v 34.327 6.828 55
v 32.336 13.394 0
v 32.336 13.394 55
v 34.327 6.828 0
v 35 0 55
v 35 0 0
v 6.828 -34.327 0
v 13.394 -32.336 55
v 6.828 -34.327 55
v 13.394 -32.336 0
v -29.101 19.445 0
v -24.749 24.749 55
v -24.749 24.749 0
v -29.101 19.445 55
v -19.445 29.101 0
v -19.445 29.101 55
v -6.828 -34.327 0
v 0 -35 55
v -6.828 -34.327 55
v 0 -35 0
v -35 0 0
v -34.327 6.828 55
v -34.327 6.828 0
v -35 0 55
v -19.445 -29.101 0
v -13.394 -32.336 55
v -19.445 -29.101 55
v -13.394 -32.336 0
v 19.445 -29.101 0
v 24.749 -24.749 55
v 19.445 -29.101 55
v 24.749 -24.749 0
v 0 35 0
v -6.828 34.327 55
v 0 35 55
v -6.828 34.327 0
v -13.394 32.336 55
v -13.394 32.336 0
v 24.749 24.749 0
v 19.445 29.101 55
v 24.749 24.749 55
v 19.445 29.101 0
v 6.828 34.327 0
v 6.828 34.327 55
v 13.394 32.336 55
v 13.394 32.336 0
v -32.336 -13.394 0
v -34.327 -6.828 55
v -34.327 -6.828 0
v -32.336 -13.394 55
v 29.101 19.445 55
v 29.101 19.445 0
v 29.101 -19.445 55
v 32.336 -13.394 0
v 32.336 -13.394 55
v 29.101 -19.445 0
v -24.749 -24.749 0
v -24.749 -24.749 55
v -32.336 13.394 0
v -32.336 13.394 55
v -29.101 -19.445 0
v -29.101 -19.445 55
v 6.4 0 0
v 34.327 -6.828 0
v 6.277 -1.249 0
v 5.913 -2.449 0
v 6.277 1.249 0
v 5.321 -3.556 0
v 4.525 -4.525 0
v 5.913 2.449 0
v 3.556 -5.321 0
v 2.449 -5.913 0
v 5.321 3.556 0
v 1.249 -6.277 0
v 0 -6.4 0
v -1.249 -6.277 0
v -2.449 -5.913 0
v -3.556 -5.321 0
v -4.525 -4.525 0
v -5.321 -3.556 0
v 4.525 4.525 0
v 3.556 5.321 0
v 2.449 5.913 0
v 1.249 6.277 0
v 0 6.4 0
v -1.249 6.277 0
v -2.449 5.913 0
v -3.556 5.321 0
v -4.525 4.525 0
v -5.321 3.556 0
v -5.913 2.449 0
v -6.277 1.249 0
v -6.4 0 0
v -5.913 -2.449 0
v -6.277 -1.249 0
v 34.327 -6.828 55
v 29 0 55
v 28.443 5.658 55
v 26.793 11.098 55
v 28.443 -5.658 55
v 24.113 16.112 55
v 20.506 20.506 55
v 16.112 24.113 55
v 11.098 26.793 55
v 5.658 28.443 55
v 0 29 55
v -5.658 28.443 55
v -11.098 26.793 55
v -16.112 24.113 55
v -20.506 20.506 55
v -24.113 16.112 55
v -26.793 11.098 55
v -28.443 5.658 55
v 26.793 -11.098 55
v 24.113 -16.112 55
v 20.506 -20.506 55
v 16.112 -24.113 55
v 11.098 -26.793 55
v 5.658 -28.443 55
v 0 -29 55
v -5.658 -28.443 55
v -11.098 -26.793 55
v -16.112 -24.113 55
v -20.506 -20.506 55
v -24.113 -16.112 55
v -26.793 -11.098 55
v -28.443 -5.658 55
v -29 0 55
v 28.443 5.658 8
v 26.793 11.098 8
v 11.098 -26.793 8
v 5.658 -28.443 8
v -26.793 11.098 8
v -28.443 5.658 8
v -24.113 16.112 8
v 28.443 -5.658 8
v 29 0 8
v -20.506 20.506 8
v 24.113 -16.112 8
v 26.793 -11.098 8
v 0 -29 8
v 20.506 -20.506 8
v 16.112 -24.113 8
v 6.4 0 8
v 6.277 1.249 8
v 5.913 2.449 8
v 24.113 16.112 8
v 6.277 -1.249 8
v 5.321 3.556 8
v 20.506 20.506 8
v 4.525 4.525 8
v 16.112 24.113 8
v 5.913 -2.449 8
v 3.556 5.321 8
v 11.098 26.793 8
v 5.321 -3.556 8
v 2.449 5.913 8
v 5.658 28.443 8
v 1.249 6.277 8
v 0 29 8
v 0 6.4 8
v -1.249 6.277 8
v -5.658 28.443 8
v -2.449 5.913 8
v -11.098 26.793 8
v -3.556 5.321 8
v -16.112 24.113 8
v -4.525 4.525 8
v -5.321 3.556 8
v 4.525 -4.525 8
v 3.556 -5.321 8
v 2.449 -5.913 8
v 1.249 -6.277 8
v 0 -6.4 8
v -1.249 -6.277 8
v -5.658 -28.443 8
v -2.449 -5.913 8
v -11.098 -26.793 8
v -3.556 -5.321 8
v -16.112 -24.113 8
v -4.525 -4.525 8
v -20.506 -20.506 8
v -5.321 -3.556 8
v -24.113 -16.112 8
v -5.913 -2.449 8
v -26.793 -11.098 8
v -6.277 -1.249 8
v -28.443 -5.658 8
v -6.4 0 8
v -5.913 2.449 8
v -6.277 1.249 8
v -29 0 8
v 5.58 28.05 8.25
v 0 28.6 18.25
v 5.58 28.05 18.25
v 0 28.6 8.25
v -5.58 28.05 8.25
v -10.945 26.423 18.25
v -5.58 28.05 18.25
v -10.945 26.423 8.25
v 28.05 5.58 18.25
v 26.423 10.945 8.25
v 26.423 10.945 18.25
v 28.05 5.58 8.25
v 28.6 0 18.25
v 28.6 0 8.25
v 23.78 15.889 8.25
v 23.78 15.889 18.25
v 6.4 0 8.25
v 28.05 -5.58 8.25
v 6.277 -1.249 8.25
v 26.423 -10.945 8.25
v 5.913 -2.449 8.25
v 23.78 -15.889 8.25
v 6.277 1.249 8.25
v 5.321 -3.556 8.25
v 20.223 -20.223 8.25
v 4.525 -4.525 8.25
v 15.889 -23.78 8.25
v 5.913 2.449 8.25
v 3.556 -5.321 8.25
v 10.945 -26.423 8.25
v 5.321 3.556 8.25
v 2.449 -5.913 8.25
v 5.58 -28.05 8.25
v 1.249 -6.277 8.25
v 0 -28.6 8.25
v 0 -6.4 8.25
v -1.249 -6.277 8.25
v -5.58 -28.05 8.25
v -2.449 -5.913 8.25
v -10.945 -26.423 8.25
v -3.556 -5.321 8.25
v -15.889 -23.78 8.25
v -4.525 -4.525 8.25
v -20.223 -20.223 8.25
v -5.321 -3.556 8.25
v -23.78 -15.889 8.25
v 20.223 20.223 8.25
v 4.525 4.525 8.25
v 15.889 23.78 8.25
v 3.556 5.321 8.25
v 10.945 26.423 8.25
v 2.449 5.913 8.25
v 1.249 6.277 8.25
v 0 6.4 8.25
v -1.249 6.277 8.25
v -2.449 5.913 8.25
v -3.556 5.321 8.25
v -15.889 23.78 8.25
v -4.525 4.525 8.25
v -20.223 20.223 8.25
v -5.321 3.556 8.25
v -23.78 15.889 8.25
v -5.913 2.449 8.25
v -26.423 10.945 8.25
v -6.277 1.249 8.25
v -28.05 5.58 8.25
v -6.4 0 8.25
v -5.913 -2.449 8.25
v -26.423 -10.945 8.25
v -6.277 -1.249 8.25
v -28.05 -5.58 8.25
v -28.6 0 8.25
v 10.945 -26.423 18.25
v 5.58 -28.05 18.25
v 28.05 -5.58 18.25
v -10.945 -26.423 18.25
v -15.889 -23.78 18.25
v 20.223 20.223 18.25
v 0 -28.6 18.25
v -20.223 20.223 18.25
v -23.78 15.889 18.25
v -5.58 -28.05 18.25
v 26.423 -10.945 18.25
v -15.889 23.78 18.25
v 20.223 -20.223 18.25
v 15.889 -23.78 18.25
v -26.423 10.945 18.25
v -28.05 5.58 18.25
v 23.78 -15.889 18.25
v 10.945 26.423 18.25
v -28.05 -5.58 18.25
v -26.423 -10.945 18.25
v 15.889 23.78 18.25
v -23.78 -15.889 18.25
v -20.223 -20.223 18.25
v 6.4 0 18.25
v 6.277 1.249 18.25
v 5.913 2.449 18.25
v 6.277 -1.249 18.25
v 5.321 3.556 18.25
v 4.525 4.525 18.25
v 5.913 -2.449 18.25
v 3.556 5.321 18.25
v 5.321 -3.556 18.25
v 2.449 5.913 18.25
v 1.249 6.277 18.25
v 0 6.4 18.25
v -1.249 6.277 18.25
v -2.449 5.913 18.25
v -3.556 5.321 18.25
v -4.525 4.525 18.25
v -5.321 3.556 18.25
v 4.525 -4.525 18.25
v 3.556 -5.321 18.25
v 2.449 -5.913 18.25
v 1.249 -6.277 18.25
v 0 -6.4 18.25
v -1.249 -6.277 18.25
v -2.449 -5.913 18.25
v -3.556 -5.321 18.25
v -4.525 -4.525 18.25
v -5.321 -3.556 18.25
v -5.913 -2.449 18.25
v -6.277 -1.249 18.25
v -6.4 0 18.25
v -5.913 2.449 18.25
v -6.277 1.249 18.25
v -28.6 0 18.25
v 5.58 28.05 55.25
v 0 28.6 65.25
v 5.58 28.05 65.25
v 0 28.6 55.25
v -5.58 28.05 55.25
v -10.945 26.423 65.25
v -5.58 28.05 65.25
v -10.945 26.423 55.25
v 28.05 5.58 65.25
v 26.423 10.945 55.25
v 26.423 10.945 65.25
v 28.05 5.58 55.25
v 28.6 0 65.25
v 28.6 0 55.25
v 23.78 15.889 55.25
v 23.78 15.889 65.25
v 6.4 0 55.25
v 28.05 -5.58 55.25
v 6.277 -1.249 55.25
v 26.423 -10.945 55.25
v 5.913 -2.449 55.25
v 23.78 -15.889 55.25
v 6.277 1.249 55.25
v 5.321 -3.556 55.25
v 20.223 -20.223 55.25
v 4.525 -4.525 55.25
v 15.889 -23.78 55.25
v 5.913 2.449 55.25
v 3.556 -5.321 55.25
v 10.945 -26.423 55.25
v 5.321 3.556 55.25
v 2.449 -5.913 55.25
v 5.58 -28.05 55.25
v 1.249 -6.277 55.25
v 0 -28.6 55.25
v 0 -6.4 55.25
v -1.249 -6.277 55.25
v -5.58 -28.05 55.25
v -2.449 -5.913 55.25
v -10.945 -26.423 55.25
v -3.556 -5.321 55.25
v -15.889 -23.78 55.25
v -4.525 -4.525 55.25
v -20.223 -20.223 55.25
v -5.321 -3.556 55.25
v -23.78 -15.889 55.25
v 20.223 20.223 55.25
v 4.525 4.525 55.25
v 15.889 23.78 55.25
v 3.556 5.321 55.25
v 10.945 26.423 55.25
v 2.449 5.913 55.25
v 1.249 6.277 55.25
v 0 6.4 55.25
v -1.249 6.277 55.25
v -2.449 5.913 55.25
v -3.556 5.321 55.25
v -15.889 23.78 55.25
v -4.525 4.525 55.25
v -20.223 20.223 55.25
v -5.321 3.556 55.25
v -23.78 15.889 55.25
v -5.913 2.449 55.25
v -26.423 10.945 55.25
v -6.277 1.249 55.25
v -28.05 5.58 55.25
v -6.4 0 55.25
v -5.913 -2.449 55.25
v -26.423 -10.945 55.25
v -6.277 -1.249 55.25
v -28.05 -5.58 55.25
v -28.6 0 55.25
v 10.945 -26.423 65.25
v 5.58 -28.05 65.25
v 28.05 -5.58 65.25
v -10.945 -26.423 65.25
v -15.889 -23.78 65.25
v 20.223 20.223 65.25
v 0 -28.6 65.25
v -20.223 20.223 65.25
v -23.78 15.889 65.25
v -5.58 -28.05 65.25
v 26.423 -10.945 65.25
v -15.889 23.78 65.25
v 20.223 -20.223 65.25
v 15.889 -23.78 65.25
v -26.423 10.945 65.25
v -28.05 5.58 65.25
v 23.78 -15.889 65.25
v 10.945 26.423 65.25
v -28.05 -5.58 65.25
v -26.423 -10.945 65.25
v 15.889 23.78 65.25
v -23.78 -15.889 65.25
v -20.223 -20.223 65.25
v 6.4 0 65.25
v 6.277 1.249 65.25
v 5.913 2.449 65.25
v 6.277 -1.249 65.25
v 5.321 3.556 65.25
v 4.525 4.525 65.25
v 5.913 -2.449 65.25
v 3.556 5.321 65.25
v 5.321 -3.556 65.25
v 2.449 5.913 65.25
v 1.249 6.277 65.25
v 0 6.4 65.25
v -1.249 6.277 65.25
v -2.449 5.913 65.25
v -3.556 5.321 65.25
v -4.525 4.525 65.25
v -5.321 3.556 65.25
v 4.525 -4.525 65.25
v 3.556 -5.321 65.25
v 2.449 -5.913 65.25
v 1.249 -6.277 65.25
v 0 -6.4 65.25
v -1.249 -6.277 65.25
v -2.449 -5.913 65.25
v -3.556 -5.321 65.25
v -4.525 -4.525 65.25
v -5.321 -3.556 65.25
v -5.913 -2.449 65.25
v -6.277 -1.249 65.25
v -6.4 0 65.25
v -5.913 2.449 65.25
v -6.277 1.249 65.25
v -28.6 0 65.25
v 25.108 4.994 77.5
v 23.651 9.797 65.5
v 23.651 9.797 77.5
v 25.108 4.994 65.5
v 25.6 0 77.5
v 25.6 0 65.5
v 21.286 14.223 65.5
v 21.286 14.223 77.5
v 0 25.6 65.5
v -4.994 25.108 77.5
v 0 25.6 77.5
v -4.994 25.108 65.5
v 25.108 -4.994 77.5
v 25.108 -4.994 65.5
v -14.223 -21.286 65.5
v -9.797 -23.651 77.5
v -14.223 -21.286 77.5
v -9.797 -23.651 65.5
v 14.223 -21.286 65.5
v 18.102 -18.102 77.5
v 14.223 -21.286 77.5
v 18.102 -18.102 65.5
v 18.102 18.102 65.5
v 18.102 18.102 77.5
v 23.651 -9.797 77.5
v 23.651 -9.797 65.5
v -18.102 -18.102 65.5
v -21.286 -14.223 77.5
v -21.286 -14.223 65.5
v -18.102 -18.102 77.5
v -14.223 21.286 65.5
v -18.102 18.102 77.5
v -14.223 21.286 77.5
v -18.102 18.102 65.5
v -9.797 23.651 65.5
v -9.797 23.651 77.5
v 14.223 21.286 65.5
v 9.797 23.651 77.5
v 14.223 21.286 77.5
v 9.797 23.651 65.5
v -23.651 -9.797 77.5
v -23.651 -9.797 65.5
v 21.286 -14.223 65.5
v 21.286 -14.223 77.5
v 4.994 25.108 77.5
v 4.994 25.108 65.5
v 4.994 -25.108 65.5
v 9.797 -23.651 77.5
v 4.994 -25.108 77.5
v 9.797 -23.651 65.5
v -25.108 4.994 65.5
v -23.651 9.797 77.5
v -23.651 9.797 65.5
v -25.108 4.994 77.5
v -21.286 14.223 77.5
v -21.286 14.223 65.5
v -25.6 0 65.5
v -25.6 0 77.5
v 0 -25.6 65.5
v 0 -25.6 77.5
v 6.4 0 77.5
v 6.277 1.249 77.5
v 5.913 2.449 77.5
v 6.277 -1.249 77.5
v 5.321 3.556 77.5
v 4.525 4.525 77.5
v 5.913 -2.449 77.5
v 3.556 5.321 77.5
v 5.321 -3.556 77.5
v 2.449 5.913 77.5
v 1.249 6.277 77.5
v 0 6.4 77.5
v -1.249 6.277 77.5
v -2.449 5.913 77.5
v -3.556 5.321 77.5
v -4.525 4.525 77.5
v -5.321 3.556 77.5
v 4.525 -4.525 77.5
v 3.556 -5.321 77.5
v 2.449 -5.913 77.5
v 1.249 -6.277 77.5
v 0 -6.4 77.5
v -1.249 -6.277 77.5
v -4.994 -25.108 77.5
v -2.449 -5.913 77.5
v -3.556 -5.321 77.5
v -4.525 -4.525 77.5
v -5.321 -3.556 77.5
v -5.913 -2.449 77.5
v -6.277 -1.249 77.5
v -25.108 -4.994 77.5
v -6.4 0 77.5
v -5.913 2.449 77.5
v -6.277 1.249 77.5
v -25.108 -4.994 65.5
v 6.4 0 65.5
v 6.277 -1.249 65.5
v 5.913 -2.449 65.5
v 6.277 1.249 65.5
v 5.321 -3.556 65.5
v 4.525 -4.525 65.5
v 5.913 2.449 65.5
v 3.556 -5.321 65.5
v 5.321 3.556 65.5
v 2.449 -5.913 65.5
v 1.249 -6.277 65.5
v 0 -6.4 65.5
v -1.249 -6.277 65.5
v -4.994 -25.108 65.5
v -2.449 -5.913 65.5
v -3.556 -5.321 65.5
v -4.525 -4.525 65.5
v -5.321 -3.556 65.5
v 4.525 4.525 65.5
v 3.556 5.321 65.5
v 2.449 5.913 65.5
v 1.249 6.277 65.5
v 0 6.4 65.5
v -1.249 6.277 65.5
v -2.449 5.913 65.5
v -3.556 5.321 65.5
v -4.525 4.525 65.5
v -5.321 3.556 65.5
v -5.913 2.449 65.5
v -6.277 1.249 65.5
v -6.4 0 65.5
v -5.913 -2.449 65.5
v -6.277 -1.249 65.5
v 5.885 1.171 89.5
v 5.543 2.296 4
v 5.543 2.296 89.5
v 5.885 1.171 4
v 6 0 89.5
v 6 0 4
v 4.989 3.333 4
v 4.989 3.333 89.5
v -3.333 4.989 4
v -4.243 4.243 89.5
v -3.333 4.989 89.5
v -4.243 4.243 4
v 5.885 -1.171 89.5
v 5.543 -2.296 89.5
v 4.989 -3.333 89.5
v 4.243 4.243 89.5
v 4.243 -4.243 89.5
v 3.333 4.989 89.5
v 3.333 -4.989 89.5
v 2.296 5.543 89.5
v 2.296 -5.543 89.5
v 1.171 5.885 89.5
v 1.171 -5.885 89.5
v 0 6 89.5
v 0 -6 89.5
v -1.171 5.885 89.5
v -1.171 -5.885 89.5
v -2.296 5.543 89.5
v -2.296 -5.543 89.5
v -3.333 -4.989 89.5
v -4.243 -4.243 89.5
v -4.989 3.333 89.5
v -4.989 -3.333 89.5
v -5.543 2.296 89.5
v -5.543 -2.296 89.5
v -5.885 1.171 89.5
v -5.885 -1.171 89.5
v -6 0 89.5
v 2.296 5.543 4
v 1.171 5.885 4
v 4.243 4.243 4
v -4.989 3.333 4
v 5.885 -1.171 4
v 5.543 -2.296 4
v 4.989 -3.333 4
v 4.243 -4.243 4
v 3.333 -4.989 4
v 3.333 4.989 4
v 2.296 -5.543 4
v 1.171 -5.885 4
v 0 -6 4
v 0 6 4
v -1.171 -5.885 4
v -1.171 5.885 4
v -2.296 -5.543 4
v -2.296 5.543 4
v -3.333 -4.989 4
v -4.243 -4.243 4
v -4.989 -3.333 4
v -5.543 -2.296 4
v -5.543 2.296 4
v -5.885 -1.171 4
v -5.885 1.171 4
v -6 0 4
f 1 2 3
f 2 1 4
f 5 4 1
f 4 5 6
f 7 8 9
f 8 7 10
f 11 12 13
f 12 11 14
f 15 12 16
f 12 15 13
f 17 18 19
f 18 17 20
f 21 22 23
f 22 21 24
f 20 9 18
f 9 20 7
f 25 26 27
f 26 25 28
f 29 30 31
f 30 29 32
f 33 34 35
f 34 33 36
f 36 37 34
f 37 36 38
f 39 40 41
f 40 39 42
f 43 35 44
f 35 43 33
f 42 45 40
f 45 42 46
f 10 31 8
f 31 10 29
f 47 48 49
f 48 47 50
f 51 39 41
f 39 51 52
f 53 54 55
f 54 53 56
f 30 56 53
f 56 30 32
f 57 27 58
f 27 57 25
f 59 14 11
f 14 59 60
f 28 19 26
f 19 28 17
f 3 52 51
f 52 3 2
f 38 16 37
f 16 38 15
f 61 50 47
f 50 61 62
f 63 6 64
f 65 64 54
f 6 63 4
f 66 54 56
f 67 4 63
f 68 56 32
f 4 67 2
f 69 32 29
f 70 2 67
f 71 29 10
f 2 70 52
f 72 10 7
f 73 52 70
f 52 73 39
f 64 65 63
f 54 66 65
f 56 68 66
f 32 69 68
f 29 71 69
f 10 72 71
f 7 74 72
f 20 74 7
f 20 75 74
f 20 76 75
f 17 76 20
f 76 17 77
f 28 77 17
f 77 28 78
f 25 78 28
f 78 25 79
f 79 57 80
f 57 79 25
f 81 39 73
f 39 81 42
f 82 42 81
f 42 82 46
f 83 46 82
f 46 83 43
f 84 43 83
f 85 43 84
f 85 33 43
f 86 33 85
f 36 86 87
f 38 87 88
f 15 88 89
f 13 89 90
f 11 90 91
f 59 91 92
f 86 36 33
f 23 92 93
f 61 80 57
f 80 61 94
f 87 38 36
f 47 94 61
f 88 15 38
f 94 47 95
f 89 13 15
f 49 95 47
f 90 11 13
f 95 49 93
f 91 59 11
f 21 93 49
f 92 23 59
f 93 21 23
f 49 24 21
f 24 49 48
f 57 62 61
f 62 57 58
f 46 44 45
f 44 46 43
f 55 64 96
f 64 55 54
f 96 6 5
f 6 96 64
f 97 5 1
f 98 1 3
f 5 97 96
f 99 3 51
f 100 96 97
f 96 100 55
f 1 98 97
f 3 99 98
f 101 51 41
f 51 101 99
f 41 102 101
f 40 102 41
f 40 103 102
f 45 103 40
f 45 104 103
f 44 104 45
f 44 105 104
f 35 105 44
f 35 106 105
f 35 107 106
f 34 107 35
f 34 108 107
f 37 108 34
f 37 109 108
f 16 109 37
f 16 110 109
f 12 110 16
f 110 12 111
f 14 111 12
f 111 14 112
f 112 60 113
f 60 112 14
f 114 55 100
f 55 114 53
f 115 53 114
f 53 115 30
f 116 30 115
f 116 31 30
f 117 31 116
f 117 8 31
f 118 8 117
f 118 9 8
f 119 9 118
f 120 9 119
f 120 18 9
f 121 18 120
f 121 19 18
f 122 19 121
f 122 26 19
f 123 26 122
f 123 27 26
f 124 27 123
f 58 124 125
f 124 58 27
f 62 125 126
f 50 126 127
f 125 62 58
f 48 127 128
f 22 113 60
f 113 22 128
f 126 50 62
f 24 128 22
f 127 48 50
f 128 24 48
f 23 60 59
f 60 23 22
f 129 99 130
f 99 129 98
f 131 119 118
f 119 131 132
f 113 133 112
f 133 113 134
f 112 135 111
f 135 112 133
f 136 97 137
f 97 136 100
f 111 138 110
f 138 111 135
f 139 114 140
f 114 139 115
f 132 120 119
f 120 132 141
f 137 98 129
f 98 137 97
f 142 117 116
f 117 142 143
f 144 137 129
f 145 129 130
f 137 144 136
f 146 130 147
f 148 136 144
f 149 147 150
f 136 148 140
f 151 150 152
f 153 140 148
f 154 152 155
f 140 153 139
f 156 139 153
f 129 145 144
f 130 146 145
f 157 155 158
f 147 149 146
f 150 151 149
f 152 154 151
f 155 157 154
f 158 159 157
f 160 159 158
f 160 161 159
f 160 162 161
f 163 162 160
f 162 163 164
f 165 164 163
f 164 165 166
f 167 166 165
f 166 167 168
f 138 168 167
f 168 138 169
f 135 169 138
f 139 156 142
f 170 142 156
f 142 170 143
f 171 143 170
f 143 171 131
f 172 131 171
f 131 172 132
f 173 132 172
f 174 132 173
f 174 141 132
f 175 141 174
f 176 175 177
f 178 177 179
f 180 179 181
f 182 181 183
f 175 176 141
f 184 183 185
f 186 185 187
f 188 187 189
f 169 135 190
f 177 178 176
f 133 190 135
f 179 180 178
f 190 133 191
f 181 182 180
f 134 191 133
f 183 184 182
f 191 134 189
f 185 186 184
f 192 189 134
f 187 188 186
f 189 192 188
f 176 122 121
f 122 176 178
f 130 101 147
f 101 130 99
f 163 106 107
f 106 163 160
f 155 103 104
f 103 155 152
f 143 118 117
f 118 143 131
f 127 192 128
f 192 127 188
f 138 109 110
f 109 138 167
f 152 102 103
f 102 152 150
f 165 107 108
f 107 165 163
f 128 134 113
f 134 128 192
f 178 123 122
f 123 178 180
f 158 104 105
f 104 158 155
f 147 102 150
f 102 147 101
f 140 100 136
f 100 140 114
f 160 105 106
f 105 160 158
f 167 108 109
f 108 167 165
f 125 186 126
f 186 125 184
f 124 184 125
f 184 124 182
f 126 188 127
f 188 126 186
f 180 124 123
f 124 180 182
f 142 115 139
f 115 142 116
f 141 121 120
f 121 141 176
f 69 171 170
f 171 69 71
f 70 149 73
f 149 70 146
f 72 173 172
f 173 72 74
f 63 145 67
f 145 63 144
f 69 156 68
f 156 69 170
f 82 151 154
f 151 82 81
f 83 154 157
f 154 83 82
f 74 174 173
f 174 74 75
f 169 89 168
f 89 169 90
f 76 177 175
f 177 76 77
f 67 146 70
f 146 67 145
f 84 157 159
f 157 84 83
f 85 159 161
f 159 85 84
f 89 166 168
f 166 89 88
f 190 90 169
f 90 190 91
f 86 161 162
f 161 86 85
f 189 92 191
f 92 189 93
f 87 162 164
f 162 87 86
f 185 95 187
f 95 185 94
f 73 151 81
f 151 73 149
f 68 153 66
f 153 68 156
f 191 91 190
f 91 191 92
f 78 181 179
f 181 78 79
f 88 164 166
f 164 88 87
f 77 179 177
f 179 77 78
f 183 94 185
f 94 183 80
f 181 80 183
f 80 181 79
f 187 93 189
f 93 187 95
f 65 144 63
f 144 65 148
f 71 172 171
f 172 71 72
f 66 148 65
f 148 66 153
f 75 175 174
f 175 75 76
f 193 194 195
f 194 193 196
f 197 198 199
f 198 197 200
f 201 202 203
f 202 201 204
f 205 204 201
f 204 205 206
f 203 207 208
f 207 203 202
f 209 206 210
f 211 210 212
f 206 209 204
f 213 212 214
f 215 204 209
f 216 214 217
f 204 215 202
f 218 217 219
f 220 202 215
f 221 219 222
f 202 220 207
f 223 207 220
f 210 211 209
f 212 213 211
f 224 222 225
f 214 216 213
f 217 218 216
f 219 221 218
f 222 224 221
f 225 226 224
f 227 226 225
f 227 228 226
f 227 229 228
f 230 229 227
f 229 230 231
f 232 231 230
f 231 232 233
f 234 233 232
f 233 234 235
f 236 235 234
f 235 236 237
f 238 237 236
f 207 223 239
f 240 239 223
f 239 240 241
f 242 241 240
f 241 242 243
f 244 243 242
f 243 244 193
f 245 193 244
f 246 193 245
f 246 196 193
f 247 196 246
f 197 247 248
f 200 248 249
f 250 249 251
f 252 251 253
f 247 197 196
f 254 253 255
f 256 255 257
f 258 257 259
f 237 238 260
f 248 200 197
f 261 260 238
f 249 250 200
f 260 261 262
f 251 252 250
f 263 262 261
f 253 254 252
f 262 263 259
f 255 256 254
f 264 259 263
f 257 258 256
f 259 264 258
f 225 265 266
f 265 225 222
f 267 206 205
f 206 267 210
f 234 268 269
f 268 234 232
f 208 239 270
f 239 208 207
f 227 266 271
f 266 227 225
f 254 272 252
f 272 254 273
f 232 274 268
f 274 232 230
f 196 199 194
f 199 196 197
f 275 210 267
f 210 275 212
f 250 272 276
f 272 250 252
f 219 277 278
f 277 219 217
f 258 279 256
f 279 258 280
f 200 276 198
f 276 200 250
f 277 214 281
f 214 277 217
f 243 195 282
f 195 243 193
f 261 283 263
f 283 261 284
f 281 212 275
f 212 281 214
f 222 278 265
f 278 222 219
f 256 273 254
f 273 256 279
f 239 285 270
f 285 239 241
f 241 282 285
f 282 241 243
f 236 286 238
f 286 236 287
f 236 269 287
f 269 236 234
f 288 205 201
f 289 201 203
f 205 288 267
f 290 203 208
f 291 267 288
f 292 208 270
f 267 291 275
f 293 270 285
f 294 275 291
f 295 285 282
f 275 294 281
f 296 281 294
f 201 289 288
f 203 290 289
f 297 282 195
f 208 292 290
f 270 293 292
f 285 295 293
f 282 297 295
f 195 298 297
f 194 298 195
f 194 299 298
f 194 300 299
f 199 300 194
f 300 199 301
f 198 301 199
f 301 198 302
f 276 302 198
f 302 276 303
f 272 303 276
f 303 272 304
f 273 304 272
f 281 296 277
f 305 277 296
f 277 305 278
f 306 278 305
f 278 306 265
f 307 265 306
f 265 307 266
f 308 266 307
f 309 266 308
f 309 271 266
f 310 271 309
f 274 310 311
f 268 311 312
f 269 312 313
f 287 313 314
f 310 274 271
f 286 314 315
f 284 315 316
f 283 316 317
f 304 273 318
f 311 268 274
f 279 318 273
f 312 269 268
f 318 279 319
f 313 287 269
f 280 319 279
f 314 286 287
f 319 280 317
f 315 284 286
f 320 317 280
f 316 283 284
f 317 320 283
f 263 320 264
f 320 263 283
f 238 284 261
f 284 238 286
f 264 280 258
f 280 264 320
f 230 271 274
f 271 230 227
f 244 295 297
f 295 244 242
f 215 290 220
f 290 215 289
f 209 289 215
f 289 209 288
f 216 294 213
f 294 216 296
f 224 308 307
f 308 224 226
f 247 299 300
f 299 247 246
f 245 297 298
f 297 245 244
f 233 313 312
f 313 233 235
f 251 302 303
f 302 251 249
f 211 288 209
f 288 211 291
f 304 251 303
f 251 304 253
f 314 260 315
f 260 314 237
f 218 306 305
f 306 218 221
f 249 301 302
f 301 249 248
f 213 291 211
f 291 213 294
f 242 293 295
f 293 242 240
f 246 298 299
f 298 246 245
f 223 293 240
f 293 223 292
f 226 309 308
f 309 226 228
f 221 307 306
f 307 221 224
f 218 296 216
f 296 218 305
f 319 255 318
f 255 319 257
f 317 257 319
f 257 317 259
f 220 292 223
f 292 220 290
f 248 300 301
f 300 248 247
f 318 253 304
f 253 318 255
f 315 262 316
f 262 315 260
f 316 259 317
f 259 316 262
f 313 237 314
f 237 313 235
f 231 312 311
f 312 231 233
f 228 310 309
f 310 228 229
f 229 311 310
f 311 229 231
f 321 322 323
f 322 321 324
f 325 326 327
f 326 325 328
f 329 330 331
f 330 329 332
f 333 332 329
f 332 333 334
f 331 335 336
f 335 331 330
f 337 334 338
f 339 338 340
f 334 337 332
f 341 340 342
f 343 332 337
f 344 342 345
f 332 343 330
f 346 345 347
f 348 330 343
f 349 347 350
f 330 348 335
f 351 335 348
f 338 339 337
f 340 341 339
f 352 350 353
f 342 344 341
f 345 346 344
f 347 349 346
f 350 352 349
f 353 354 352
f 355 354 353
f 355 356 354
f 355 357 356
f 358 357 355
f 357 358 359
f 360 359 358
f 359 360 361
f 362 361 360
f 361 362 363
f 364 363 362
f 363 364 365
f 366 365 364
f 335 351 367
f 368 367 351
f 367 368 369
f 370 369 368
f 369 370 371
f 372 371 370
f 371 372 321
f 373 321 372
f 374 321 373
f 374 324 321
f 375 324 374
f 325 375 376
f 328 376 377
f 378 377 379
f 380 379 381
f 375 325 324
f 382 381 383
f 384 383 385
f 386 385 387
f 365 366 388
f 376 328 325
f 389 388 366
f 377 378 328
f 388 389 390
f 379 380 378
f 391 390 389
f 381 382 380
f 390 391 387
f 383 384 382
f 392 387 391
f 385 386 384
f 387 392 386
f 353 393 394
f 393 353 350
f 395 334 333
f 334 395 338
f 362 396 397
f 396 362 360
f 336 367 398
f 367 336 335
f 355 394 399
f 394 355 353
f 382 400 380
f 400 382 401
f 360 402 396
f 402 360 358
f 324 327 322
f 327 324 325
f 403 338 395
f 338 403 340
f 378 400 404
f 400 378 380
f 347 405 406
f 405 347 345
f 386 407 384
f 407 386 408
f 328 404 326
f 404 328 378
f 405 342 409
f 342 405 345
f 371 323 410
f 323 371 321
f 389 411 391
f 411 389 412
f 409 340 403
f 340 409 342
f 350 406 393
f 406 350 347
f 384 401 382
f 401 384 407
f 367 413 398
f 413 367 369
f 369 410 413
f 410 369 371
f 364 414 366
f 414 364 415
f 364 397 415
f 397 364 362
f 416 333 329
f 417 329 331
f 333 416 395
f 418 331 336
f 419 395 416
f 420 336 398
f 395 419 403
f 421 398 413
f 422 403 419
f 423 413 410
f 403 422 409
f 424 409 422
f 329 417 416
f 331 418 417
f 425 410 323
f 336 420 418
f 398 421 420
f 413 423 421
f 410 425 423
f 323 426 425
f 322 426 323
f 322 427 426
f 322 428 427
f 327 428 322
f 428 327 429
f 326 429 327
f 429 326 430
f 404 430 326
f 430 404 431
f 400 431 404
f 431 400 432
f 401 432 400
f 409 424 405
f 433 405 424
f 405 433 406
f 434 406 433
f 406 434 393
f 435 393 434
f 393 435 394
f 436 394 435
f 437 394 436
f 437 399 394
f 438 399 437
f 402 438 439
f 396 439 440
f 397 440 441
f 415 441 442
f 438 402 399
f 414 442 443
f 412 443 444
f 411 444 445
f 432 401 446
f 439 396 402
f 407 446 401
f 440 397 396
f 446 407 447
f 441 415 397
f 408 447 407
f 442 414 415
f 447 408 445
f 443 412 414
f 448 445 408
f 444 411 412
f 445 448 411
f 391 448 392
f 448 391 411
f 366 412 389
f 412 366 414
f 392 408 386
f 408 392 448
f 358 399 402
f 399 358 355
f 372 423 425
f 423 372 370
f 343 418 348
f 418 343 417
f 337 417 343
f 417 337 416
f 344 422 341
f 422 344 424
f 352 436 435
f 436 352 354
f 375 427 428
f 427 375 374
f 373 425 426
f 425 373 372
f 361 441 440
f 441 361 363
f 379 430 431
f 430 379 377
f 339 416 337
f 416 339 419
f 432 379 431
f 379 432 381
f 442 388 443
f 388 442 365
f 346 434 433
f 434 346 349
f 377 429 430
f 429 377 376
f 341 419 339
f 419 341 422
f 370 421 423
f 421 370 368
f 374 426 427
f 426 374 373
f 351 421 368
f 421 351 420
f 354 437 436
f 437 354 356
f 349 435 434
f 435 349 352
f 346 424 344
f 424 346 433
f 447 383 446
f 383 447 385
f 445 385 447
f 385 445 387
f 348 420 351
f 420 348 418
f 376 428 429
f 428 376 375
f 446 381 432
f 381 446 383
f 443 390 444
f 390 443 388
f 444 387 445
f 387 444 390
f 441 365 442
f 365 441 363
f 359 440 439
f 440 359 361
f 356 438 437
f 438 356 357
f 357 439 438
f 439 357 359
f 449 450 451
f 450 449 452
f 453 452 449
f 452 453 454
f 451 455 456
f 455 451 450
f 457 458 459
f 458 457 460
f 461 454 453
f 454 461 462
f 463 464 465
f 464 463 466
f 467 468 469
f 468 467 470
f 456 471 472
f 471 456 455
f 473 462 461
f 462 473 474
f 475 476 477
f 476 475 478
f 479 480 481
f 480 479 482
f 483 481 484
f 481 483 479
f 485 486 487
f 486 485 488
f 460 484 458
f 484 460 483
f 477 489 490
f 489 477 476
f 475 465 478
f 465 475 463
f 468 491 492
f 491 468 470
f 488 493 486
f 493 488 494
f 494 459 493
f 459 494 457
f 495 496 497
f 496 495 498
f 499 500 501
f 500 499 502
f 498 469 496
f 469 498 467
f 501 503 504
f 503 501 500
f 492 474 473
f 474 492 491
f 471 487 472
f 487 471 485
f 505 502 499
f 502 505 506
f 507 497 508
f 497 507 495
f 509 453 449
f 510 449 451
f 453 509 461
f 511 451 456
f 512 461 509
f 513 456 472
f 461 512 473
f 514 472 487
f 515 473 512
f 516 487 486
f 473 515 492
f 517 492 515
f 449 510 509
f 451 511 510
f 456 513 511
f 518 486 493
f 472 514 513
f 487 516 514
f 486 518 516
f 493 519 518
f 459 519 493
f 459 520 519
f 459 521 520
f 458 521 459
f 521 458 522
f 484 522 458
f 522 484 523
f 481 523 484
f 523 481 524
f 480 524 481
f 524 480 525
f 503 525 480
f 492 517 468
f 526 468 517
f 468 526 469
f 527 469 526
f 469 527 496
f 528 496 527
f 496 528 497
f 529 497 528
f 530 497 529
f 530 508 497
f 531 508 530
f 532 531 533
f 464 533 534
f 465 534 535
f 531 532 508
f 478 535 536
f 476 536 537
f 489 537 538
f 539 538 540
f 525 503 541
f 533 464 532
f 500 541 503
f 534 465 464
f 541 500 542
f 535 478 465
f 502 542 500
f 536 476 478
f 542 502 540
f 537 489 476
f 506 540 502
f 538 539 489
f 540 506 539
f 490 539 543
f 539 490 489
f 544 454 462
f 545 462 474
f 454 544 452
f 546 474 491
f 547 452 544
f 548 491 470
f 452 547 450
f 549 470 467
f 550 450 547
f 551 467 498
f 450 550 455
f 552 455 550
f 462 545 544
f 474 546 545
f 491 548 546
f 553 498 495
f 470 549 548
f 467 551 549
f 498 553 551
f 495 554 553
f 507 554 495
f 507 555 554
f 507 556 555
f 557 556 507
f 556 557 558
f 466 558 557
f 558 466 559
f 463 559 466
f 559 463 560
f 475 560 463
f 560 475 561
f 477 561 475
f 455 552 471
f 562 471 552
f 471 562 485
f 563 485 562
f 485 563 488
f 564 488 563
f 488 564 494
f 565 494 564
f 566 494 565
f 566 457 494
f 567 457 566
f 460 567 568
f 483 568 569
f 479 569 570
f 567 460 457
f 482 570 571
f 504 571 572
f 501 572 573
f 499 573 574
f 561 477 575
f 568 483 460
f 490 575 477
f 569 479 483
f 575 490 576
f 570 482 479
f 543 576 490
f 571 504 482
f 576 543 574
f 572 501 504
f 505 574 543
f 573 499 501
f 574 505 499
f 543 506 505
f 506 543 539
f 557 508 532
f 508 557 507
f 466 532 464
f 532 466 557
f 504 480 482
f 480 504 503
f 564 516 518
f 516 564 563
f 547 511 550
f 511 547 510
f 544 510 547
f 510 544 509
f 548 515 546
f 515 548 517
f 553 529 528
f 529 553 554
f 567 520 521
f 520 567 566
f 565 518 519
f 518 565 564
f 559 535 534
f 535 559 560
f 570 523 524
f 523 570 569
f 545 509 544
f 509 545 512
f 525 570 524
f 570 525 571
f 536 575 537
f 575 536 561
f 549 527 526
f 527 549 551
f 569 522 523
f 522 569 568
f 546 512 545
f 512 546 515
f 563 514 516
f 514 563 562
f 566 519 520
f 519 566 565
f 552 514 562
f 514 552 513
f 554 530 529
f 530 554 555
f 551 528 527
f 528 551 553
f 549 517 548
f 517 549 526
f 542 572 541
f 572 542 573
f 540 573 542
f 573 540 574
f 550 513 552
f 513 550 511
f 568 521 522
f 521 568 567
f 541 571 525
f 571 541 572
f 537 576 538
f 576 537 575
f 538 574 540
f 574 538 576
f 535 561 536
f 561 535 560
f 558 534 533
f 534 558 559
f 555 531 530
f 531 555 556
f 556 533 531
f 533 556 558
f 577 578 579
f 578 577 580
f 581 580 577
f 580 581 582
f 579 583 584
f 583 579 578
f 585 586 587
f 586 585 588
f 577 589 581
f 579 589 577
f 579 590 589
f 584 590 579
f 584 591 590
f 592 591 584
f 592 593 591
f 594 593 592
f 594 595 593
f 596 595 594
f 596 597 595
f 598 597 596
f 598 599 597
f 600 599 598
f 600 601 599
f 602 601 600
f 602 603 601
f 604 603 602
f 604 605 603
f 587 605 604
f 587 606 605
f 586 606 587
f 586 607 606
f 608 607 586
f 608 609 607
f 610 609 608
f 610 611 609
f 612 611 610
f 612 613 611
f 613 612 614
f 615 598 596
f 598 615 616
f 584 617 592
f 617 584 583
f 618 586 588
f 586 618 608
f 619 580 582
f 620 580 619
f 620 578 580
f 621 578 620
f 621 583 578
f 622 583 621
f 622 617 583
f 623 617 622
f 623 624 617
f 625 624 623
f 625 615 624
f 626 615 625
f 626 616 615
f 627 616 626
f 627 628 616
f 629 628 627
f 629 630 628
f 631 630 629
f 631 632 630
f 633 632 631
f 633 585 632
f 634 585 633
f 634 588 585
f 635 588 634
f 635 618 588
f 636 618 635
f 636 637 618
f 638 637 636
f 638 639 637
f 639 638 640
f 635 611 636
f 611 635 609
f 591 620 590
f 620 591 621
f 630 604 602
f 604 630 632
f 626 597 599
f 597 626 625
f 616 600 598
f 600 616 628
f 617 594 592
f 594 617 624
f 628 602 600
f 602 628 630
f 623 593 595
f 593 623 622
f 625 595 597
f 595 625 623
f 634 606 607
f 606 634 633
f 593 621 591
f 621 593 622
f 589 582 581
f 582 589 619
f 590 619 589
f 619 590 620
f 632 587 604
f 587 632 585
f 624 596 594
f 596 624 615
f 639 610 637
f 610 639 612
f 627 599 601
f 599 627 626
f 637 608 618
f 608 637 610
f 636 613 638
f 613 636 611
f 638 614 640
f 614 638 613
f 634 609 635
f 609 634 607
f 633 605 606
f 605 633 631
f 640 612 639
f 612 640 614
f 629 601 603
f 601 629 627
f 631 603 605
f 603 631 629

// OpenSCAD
$fn = 32;

// ------------------------------------------------------------------------
// Bearing housing: housing d70, two bearings and a shaft
// Every part is its own module, assembly() places them once.
// ------------------------------------------------------------------------

// --- part 1 ---
module housing() {
  difference() {
    cylinder(h = 55, d = 70);
    translate([0, 0, 8]) cylinder(h = 48, d = 58);
    translate([0, 0, -1]) cylinder(h = 10, d = 12.8);
  }
}

// --- part 2 ---
module bearing_lower() {
  difference() {
      translate([0, 0, 0]) cylinder(h = 10, d = 57.2);
      translate([0, 0, -1]) cylinder(h = 12, d = 12.8);
    }
}

// --- part 3 ---
module bearing_upper() {
  difference() {
      translate([0, 0, 0]) cylinder(h = 10, d = 57.2);
      translate([0, 0, -1]) cylinder(h = 12, d = 12.8);
    }
}

// --- part 4 ---
module spacer() {
  difference() {
      translate([0, 0, 0]) cylinder(h = 12, d = 51.2);
      translate([0, 0, -1]) cylinder(h = 14, d = 12.8);
    }
}

// --- part 5 ---
module shaft() {
  translate([0, 0, -42.75]) cylinder(h = 85.5, d = 12);
}

// --- assembly ---
module assembly() {
  translate([0, 0, 0]) rotate([0, 0, 0]) housing();
  translate([0, 0, 8.25]) rotate([0, 0, 0]) bearing_lower();
  translate([0, 0, 55.25]) rotate([0, 0, 0]) bearing_upper();
  translate([0, 0, 65.5]) rotate([0, 0, 0]) spacer();
  translate([0, 0, 46.75]) rotate([0, 0, 0]) shaft();
}

assembly();
